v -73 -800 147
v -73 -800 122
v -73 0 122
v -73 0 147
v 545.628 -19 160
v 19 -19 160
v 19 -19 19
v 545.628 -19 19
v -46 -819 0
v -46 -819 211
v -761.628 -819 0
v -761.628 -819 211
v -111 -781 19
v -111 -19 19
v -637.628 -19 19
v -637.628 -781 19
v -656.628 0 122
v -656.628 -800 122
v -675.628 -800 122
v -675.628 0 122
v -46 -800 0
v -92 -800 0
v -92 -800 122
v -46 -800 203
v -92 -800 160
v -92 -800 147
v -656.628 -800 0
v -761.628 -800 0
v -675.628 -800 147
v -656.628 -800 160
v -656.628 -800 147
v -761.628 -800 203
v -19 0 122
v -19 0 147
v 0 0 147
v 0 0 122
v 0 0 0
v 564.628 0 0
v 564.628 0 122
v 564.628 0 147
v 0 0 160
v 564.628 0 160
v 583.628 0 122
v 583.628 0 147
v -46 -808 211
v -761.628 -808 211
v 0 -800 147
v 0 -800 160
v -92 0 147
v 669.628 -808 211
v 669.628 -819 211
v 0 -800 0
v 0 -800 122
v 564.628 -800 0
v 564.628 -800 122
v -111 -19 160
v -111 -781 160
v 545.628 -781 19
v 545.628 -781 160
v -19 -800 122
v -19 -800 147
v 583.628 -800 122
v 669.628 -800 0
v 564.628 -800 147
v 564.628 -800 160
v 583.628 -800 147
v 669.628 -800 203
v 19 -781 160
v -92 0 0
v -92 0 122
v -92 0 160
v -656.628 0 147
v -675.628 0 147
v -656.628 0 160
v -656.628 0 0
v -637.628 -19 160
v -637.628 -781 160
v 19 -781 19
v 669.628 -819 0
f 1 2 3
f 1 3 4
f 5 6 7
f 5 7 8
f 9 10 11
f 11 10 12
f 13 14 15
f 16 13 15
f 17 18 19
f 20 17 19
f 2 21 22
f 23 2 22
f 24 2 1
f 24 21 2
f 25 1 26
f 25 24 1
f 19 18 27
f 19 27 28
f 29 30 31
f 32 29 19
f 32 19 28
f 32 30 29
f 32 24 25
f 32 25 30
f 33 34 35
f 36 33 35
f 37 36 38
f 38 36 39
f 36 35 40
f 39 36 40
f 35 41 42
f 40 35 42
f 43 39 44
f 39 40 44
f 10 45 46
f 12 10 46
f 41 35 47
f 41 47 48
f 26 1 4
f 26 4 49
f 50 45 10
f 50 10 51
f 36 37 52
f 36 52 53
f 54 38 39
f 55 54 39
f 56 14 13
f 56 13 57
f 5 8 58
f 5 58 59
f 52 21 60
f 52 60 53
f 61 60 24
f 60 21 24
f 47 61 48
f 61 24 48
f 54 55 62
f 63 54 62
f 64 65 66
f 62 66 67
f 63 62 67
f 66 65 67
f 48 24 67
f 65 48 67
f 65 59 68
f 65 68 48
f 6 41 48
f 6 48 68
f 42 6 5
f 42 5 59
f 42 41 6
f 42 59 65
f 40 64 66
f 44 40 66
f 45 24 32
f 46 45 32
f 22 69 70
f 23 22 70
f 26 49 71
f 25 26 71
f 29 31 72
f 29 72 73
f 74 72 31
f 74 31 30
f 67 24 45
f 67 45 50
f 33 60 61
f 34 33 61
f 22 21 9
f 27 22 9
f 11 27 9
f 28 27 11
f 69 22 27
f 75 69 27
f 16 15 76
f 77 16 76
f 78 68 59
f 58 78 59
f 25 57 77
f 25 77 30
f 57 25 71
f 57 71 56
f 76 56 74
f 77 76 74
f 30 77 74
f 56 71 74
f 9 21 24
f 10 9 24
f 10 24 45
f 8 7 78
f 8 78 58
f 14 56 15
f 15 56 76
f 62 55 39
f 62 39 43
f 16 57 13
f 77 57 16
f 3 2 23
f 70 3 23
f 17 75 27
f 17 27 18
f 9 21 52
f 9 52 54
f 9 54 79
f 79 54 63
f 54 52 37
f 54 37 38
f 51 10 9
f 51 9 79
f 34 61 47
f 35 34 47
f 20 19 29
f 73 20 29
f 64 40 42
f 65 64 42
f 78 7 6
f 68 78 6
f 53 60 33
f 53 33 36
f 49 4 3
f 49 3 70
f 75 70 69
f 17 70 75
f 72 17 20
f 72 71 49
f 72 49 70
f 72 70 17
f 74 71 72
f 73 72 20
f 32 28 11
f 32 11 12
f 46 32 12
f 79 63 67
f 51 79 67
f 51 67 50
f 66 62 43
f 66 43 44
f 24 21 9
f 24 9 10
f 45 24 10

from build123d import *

# Parameters (mm, degrees)
F0_W     = 564.628
F0_H     = 160
F1_DEPTH = 800
F2_T     = -19
F3_W     = 19
F3_H     = 25
F4_DEPTH = 800
F6_W     = 715.628
F6_H     = 211
F7_DEPTH = 19
F9_SIZE  = 8


with BuildPart() as f1:
    # F0 (on Front) → F1 (new body)
    with BuildSketch(Plane.XZ):
        with Locations((282.314, 80)):
            Rectangle(F0_W, F0_H)
    extrude(amount=F1_DEPTH)

    # F2
    f2_openings = [f1.faces().sort_by_distance(p)[0] for p in [
        (282.314, -400, 160),
    ]]
    offset(amount=F2_T, openings=f2_openings)


with BuildPart() as f4:
    # F3 (on face) → F4 (new body)
    with BuildSketch(Plane.XZ.offset(800)):
        with Locations((-9.5, 134.5)):
            Rectangle(F3_W, F3_H)
        with Locations((574.128, 134.5)):
            Rectangle(F3_W, F3_H)
    extrude(amount=-F4_DEPTH)


with BuildPart() as f1_1:
    add(f1.part)

    # F5: union F4
    add(f4.part)

    # F6 (on face) → F7 (join)
    with BuildSketch(Plane.XZ.offset(800)):
        with Locations((311.814, 105.5)):
            Rectangle(F6_W, F6_H)
    extrude(amount=F7_DEPTH)

    # F9
    f9_edges = [f1_1.edges().sort_by_distance(p)[0] for p in [
        (311.814, -800, 211),
    ]]
    chamfer(f9_edges, length=F9_SIZE)


with BuildPart() as f10_1:
    # F10: instance of F1
    add(f1_1.part.mirror(Plane(origin=(-46, -809.554983, 104.672576), x_dir=(0, -1, 0), z_dir=(-1, 0, 0))))


solid = Compound([f1_1.part, f10_1.part])
